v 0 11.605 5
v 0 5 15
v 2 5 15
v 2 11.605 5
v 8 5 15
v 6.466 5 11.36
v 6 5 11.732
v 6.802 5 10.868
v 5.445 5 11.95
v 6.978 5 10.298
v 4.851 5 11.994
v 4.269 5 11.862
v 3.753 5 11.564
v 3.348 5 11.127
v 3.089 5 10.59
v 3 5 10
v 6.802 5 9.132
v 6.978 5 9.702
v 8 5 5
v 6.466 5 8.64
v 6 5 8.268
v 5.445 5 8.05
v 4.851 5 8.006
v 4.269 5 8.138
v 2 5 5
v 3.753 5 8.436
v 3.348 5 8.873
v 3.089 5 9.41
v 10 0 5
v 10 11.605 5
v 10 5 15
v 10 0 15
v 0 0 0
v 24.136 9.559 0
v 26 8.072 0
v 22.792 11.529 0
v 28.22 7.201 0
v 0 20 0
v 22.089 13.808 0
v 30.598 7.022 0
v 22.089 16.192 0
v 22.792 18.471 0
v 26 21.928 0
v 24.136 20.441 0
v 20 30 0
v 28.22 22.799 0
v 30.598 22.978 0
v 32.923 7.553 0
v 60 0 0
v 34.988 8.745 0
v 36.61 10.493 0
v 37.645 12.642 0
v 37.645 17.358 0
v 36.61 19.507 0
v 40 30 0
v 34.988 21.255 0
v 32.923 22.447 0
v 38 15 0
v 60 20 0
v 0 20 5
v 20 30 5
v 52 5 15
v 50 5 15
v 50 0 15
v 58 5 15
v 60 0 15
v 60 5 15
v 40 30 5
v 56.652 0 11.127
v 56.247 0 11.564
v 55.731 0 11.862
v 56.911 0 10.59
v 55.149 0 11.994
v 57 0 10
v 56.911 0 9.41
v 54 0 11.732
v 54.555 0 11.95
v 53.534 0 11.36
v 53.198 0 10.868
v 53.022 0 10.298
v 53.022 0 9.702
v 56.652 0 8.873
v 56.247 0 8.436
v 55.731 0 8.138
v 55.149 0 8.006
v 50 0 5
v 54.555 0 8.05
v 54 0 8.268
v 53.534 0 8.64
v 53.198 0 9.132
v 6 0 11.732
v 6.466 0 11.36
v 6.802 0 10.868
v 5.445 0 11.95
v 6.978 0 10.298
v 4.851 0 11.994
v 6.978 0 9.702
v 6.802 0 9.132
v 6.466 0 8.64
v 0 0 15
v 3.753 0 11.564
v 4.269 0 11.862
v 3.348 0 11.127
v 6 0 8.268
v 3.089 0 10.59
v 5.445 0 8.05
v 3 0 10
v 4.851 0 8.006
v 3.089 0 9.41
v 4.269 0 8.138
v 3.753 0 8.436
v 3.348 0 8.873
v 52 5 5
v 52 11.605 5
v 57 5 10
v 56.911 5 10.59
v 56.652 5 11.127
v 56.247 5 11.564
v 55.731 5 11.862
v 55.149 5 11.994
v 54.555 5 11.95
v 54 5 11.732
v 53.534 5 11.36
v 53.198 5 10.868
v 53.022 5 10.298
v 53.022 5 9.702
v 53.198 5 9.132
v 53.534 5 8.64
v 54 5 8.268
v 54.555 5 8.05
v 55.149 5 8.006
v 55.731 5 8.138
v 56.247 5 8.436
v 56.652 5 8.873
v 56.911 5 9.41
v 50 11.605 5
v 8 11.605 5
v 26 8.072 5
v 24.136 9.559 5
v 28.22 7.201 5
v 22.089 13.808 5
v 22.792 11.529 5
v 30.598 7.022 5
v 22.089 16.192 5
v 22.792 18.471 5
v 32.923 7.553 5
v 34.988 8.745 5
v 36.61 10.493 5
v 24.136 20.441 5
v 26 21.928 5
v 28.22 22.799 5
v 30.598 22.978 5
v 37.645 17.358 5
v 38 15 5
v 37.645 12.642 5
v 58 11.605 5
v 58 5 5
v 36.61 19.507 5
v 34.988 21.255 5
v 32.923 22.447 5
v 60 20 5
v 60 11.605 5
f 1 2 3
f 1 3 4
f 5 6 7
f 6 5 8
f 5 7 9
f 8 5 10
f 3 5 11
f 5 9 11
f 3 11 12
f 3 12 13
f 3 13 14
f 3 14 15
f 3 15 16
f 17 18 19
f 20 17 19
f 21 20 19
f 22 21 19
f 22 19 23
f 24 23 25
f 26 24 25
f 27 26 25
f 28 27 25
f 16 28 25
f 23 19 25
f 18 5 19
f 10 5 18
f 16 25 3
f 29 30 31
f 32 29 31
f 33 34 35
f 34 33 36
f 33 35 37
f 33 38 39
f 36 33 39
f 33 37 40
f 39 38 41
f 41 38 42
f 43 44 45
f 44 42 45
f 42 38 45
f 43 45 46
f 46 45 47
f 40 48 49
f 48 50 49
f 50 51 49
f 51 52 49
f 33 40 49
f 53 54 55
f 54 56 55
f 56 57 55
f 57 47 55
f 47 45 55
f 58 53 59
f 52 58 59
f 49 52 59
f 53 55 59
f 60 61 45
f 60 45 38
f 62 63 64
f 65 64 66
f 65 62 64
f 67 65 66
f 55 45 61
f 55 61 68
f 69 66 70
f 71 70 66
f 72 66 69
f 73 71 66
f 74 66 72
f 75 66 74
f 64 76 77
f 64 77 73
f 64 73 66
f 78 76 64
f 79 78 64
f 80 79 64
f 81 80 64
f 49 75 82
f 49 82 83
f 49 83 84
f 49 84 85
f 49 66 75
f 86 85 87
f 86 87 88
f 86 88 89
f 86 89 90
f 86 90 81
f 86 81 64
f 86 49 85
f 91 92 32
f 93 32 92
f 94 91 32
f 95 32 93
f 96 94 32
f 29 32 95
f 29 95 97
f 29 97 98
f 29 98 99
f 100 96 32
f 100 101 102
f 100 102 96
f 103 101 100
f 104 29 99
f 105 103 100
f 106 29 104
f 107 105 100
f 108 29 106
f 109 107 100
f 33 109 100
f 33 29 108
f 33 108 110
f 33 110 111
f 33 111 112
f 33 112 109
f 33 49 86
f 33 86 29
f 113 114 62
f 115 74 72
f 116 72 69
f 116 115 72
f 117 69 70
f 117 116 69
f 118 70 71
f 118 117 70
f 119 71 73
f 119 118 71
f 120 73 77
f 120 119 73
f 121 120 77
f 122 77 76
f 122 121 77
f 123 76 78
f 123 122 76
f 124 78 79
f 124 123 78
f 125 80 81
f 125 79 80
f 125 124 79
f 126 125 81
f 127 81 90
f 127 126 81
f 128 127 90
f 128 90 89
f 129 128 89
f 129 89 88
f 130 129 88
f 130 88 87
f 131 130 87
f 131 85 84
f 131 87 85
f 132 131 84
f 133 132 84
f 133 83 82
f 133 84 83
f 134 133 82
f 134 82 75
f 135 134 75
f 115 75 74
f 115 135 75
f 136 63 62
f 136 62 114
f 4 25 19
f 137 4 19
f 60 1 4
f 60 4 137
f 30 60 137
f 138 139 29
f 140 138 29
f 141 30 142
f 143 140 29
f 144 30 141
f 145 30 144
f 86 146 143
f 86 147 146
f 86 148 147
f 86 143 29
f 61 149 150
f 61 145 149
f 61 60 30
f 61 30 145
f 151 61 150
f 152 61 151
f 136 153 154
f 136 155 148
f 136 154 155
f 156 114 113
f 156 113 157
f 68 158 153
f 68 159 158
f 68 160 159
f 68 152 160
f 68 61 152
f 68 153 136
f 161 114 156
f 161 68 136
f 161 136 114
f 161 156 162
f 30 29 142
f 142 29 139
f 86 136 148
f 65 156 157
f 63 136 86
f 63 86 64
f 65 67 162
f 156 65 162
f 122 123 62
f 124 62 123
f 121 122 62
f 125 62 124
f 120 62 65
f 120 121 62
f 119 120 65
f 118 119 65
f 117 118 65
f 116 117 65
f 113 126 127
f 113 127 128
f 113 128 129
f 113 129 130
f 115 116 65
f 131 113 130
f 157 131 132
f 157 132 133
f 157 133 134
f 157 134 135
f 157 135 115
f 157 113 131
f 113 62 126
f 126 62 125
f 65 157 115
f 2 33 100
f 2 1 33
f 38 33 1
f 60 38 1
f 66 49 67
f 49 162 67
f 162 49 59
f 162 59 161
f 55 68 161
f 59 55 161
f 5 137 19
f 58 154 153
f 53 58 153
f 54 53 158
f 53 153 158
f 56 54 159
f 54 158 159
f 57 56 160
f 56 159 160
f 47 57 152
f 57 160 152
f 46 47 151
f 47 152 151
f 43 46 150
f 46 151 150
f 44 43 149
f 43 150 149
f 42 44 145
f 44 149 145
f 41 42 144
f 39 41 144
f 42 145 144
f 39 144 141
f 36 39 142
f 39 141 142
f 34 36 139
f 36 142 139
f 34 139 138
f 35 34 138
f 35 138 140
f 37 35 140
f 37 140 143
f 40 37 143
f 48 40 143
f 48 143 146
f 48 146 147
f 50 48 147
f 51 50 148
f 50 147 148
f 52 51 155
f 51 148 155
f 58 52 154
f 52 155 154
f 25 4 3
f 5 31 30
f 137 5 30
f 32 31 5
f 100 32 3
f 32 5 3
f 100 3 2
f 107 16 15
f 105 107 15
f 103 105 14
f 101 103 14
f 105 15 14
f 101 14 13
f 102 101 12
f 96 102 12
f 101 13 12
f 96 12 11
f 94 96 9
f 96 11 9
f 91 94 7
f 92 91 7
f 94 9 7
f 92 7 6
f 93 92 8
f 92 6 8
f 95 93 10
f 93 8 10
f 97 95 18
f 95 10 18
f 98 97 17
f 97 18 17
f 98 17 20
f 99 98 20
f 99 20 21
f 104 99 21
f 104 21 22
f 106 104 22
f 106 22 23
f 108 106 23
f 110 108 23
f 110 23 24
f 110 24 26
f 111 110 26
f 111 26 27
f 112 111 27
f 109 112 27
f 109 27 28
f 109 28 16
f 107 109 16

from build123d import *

# Parameters (mm, degrees)
ESQUISSE1_W             = 60
ESQUISSE1_H             = 30
BOSS_EXTRU_1_DEPTH      = 5
ESQUISSE2_R             = 8
ENL_V_MAT_EXTRU_1_DEPTH = 5
ESQUISSE4_W             = 10
ESQUISSE4_H             = 5
BOSS_EXTRU_2_DEPTH      = 10
ESQUISSE6_R             = 2
ENL_V_MAT_EXTRU_2_DEPTH = 10
BOSS_EXTRU_3_DEPTH      = 2
SYM_TRIE4_COPY_1_DEPTH  = 2
ENL_V_MAT_EXTRU_3_DEPTH = 68.823299831


with BuildPart() as part:
    # Esquisse1 → Boss.-Extru.1 (new body)
    with BuildSketch(Plane.XY):
        with Locations((30, 15)):
            Rectangle(ESQUISSE1_W, ESQUISSE1_H)
    extrude(amount=BOSS_EXTRU_1_DEPTH)

    # Esquisse2 → Enlèv. mat.-Extru.1 (cut)
    with BuildSketch(Plane.XY.offset(5)):
        with Locations((30, 15)):
            Circle(ESQUISSE2_R)
    extrude(amount=-ENL_V_MAT_EXTRU_1_DEPTH, mode=Mode.SUBTRACT)

    # Esquisse4 → Boss.-Extru.2 (add)
    with BuildSketch(Plane.XY.offset(5)):
        with Locations((55, 2.5)):
            Rectangle(ESQUISSE4_W, ESQUISSE4_H)
    boss_extru_2 = extrude(amount=BOSS_EXTRU_2_DEPTH)

    # Symétrie1: Boss.-Extru.2 across plane
    add(boss_extru_2.mirror(Plane(origin=(30, 0, 0), x_dir=(0, 0, 1), z_dir=(1, 0, 0))))

    # Esquisse6 → Enlèv. mat.-Extru.2 (cut)
    with BuildSketch(Plane(origin=(0, 5, 0), x_dir=(1, 0, 0), z_dir=(0, 1, 0))):
        with Locations(Location((5, -10, 0), (0, 0, 180))):
            Circle(ESQUISSE6_R)
    enl_v_mat_extru_2 = extrude(amount=-ENL_V_MAT_EXTRU_2_DEPTH, mode=Mode.SUBTRACT)

    # Symétrie2: Enlèv. mat.-Extru.2 across plane
    add(enl_v_mat_extru_2.mirror(Plane(origin=(30, 0, 0), x_dir=(0, 0, 1), z_dir=(1, 0, 0))), mode=Mode.SUBTRACT)

    # Esquisse13 → Boss.-Extru.3 (add)
    with BuildSketch(Plane.ZY):
        Polygon((15, 5), (5, 11.605187872), (5, 5), align=None)
    boss_extru_3 = extrude(amount=-BOSS_EXTRU_3_DEPTH)

    # Symétrie3: Boss.-Extru.3 across plane
    add(boss_extru_3.mirror(Plane.ZY.offset(-5)))

    # Symétrie4: Boss.-Extru.3 across plane
    add(boss_extru_3.mirror(Plane(origin=(30, 0, 0), x_dir=(0, 0, 1), z_dir=(1, 0, 0))))

    # Symétrie4 copy 1 sketch → Symétrie4 copy 1 (add)
    with BuildSketch(Plane.ZY.offset(-50)):
        Polygon((15, 5), (5, 11.605187872), (5, 5), align=None)
    extrude(amount=-SYM_TRIE4_COPY_1_DEPTH)

    # Esquisse14 → Enlèv. mat.-Extru.3 (cut, through all)
    with BuildSketch(Plane.XY.offset(5)):
        Polygon((20, 30), (0, 20), (0, 30), align=None)
    enl_v_mat_extru_3 = extrude(amount=-ENL_V_MAT_EXTRU_3_DEPTH, mode=Mode.SUBTRACT)

    # Symétrie5: Enlèv. mat.-Extru.3 across plane
    add(enl_v_mat_extru_3.mirror(Plane(origin=(30, 0, 0), x_dir=(0, 0, 1), z_dir=(1, 0, 0))), mode=Mode.SUBTRACT)


solid = part.part
